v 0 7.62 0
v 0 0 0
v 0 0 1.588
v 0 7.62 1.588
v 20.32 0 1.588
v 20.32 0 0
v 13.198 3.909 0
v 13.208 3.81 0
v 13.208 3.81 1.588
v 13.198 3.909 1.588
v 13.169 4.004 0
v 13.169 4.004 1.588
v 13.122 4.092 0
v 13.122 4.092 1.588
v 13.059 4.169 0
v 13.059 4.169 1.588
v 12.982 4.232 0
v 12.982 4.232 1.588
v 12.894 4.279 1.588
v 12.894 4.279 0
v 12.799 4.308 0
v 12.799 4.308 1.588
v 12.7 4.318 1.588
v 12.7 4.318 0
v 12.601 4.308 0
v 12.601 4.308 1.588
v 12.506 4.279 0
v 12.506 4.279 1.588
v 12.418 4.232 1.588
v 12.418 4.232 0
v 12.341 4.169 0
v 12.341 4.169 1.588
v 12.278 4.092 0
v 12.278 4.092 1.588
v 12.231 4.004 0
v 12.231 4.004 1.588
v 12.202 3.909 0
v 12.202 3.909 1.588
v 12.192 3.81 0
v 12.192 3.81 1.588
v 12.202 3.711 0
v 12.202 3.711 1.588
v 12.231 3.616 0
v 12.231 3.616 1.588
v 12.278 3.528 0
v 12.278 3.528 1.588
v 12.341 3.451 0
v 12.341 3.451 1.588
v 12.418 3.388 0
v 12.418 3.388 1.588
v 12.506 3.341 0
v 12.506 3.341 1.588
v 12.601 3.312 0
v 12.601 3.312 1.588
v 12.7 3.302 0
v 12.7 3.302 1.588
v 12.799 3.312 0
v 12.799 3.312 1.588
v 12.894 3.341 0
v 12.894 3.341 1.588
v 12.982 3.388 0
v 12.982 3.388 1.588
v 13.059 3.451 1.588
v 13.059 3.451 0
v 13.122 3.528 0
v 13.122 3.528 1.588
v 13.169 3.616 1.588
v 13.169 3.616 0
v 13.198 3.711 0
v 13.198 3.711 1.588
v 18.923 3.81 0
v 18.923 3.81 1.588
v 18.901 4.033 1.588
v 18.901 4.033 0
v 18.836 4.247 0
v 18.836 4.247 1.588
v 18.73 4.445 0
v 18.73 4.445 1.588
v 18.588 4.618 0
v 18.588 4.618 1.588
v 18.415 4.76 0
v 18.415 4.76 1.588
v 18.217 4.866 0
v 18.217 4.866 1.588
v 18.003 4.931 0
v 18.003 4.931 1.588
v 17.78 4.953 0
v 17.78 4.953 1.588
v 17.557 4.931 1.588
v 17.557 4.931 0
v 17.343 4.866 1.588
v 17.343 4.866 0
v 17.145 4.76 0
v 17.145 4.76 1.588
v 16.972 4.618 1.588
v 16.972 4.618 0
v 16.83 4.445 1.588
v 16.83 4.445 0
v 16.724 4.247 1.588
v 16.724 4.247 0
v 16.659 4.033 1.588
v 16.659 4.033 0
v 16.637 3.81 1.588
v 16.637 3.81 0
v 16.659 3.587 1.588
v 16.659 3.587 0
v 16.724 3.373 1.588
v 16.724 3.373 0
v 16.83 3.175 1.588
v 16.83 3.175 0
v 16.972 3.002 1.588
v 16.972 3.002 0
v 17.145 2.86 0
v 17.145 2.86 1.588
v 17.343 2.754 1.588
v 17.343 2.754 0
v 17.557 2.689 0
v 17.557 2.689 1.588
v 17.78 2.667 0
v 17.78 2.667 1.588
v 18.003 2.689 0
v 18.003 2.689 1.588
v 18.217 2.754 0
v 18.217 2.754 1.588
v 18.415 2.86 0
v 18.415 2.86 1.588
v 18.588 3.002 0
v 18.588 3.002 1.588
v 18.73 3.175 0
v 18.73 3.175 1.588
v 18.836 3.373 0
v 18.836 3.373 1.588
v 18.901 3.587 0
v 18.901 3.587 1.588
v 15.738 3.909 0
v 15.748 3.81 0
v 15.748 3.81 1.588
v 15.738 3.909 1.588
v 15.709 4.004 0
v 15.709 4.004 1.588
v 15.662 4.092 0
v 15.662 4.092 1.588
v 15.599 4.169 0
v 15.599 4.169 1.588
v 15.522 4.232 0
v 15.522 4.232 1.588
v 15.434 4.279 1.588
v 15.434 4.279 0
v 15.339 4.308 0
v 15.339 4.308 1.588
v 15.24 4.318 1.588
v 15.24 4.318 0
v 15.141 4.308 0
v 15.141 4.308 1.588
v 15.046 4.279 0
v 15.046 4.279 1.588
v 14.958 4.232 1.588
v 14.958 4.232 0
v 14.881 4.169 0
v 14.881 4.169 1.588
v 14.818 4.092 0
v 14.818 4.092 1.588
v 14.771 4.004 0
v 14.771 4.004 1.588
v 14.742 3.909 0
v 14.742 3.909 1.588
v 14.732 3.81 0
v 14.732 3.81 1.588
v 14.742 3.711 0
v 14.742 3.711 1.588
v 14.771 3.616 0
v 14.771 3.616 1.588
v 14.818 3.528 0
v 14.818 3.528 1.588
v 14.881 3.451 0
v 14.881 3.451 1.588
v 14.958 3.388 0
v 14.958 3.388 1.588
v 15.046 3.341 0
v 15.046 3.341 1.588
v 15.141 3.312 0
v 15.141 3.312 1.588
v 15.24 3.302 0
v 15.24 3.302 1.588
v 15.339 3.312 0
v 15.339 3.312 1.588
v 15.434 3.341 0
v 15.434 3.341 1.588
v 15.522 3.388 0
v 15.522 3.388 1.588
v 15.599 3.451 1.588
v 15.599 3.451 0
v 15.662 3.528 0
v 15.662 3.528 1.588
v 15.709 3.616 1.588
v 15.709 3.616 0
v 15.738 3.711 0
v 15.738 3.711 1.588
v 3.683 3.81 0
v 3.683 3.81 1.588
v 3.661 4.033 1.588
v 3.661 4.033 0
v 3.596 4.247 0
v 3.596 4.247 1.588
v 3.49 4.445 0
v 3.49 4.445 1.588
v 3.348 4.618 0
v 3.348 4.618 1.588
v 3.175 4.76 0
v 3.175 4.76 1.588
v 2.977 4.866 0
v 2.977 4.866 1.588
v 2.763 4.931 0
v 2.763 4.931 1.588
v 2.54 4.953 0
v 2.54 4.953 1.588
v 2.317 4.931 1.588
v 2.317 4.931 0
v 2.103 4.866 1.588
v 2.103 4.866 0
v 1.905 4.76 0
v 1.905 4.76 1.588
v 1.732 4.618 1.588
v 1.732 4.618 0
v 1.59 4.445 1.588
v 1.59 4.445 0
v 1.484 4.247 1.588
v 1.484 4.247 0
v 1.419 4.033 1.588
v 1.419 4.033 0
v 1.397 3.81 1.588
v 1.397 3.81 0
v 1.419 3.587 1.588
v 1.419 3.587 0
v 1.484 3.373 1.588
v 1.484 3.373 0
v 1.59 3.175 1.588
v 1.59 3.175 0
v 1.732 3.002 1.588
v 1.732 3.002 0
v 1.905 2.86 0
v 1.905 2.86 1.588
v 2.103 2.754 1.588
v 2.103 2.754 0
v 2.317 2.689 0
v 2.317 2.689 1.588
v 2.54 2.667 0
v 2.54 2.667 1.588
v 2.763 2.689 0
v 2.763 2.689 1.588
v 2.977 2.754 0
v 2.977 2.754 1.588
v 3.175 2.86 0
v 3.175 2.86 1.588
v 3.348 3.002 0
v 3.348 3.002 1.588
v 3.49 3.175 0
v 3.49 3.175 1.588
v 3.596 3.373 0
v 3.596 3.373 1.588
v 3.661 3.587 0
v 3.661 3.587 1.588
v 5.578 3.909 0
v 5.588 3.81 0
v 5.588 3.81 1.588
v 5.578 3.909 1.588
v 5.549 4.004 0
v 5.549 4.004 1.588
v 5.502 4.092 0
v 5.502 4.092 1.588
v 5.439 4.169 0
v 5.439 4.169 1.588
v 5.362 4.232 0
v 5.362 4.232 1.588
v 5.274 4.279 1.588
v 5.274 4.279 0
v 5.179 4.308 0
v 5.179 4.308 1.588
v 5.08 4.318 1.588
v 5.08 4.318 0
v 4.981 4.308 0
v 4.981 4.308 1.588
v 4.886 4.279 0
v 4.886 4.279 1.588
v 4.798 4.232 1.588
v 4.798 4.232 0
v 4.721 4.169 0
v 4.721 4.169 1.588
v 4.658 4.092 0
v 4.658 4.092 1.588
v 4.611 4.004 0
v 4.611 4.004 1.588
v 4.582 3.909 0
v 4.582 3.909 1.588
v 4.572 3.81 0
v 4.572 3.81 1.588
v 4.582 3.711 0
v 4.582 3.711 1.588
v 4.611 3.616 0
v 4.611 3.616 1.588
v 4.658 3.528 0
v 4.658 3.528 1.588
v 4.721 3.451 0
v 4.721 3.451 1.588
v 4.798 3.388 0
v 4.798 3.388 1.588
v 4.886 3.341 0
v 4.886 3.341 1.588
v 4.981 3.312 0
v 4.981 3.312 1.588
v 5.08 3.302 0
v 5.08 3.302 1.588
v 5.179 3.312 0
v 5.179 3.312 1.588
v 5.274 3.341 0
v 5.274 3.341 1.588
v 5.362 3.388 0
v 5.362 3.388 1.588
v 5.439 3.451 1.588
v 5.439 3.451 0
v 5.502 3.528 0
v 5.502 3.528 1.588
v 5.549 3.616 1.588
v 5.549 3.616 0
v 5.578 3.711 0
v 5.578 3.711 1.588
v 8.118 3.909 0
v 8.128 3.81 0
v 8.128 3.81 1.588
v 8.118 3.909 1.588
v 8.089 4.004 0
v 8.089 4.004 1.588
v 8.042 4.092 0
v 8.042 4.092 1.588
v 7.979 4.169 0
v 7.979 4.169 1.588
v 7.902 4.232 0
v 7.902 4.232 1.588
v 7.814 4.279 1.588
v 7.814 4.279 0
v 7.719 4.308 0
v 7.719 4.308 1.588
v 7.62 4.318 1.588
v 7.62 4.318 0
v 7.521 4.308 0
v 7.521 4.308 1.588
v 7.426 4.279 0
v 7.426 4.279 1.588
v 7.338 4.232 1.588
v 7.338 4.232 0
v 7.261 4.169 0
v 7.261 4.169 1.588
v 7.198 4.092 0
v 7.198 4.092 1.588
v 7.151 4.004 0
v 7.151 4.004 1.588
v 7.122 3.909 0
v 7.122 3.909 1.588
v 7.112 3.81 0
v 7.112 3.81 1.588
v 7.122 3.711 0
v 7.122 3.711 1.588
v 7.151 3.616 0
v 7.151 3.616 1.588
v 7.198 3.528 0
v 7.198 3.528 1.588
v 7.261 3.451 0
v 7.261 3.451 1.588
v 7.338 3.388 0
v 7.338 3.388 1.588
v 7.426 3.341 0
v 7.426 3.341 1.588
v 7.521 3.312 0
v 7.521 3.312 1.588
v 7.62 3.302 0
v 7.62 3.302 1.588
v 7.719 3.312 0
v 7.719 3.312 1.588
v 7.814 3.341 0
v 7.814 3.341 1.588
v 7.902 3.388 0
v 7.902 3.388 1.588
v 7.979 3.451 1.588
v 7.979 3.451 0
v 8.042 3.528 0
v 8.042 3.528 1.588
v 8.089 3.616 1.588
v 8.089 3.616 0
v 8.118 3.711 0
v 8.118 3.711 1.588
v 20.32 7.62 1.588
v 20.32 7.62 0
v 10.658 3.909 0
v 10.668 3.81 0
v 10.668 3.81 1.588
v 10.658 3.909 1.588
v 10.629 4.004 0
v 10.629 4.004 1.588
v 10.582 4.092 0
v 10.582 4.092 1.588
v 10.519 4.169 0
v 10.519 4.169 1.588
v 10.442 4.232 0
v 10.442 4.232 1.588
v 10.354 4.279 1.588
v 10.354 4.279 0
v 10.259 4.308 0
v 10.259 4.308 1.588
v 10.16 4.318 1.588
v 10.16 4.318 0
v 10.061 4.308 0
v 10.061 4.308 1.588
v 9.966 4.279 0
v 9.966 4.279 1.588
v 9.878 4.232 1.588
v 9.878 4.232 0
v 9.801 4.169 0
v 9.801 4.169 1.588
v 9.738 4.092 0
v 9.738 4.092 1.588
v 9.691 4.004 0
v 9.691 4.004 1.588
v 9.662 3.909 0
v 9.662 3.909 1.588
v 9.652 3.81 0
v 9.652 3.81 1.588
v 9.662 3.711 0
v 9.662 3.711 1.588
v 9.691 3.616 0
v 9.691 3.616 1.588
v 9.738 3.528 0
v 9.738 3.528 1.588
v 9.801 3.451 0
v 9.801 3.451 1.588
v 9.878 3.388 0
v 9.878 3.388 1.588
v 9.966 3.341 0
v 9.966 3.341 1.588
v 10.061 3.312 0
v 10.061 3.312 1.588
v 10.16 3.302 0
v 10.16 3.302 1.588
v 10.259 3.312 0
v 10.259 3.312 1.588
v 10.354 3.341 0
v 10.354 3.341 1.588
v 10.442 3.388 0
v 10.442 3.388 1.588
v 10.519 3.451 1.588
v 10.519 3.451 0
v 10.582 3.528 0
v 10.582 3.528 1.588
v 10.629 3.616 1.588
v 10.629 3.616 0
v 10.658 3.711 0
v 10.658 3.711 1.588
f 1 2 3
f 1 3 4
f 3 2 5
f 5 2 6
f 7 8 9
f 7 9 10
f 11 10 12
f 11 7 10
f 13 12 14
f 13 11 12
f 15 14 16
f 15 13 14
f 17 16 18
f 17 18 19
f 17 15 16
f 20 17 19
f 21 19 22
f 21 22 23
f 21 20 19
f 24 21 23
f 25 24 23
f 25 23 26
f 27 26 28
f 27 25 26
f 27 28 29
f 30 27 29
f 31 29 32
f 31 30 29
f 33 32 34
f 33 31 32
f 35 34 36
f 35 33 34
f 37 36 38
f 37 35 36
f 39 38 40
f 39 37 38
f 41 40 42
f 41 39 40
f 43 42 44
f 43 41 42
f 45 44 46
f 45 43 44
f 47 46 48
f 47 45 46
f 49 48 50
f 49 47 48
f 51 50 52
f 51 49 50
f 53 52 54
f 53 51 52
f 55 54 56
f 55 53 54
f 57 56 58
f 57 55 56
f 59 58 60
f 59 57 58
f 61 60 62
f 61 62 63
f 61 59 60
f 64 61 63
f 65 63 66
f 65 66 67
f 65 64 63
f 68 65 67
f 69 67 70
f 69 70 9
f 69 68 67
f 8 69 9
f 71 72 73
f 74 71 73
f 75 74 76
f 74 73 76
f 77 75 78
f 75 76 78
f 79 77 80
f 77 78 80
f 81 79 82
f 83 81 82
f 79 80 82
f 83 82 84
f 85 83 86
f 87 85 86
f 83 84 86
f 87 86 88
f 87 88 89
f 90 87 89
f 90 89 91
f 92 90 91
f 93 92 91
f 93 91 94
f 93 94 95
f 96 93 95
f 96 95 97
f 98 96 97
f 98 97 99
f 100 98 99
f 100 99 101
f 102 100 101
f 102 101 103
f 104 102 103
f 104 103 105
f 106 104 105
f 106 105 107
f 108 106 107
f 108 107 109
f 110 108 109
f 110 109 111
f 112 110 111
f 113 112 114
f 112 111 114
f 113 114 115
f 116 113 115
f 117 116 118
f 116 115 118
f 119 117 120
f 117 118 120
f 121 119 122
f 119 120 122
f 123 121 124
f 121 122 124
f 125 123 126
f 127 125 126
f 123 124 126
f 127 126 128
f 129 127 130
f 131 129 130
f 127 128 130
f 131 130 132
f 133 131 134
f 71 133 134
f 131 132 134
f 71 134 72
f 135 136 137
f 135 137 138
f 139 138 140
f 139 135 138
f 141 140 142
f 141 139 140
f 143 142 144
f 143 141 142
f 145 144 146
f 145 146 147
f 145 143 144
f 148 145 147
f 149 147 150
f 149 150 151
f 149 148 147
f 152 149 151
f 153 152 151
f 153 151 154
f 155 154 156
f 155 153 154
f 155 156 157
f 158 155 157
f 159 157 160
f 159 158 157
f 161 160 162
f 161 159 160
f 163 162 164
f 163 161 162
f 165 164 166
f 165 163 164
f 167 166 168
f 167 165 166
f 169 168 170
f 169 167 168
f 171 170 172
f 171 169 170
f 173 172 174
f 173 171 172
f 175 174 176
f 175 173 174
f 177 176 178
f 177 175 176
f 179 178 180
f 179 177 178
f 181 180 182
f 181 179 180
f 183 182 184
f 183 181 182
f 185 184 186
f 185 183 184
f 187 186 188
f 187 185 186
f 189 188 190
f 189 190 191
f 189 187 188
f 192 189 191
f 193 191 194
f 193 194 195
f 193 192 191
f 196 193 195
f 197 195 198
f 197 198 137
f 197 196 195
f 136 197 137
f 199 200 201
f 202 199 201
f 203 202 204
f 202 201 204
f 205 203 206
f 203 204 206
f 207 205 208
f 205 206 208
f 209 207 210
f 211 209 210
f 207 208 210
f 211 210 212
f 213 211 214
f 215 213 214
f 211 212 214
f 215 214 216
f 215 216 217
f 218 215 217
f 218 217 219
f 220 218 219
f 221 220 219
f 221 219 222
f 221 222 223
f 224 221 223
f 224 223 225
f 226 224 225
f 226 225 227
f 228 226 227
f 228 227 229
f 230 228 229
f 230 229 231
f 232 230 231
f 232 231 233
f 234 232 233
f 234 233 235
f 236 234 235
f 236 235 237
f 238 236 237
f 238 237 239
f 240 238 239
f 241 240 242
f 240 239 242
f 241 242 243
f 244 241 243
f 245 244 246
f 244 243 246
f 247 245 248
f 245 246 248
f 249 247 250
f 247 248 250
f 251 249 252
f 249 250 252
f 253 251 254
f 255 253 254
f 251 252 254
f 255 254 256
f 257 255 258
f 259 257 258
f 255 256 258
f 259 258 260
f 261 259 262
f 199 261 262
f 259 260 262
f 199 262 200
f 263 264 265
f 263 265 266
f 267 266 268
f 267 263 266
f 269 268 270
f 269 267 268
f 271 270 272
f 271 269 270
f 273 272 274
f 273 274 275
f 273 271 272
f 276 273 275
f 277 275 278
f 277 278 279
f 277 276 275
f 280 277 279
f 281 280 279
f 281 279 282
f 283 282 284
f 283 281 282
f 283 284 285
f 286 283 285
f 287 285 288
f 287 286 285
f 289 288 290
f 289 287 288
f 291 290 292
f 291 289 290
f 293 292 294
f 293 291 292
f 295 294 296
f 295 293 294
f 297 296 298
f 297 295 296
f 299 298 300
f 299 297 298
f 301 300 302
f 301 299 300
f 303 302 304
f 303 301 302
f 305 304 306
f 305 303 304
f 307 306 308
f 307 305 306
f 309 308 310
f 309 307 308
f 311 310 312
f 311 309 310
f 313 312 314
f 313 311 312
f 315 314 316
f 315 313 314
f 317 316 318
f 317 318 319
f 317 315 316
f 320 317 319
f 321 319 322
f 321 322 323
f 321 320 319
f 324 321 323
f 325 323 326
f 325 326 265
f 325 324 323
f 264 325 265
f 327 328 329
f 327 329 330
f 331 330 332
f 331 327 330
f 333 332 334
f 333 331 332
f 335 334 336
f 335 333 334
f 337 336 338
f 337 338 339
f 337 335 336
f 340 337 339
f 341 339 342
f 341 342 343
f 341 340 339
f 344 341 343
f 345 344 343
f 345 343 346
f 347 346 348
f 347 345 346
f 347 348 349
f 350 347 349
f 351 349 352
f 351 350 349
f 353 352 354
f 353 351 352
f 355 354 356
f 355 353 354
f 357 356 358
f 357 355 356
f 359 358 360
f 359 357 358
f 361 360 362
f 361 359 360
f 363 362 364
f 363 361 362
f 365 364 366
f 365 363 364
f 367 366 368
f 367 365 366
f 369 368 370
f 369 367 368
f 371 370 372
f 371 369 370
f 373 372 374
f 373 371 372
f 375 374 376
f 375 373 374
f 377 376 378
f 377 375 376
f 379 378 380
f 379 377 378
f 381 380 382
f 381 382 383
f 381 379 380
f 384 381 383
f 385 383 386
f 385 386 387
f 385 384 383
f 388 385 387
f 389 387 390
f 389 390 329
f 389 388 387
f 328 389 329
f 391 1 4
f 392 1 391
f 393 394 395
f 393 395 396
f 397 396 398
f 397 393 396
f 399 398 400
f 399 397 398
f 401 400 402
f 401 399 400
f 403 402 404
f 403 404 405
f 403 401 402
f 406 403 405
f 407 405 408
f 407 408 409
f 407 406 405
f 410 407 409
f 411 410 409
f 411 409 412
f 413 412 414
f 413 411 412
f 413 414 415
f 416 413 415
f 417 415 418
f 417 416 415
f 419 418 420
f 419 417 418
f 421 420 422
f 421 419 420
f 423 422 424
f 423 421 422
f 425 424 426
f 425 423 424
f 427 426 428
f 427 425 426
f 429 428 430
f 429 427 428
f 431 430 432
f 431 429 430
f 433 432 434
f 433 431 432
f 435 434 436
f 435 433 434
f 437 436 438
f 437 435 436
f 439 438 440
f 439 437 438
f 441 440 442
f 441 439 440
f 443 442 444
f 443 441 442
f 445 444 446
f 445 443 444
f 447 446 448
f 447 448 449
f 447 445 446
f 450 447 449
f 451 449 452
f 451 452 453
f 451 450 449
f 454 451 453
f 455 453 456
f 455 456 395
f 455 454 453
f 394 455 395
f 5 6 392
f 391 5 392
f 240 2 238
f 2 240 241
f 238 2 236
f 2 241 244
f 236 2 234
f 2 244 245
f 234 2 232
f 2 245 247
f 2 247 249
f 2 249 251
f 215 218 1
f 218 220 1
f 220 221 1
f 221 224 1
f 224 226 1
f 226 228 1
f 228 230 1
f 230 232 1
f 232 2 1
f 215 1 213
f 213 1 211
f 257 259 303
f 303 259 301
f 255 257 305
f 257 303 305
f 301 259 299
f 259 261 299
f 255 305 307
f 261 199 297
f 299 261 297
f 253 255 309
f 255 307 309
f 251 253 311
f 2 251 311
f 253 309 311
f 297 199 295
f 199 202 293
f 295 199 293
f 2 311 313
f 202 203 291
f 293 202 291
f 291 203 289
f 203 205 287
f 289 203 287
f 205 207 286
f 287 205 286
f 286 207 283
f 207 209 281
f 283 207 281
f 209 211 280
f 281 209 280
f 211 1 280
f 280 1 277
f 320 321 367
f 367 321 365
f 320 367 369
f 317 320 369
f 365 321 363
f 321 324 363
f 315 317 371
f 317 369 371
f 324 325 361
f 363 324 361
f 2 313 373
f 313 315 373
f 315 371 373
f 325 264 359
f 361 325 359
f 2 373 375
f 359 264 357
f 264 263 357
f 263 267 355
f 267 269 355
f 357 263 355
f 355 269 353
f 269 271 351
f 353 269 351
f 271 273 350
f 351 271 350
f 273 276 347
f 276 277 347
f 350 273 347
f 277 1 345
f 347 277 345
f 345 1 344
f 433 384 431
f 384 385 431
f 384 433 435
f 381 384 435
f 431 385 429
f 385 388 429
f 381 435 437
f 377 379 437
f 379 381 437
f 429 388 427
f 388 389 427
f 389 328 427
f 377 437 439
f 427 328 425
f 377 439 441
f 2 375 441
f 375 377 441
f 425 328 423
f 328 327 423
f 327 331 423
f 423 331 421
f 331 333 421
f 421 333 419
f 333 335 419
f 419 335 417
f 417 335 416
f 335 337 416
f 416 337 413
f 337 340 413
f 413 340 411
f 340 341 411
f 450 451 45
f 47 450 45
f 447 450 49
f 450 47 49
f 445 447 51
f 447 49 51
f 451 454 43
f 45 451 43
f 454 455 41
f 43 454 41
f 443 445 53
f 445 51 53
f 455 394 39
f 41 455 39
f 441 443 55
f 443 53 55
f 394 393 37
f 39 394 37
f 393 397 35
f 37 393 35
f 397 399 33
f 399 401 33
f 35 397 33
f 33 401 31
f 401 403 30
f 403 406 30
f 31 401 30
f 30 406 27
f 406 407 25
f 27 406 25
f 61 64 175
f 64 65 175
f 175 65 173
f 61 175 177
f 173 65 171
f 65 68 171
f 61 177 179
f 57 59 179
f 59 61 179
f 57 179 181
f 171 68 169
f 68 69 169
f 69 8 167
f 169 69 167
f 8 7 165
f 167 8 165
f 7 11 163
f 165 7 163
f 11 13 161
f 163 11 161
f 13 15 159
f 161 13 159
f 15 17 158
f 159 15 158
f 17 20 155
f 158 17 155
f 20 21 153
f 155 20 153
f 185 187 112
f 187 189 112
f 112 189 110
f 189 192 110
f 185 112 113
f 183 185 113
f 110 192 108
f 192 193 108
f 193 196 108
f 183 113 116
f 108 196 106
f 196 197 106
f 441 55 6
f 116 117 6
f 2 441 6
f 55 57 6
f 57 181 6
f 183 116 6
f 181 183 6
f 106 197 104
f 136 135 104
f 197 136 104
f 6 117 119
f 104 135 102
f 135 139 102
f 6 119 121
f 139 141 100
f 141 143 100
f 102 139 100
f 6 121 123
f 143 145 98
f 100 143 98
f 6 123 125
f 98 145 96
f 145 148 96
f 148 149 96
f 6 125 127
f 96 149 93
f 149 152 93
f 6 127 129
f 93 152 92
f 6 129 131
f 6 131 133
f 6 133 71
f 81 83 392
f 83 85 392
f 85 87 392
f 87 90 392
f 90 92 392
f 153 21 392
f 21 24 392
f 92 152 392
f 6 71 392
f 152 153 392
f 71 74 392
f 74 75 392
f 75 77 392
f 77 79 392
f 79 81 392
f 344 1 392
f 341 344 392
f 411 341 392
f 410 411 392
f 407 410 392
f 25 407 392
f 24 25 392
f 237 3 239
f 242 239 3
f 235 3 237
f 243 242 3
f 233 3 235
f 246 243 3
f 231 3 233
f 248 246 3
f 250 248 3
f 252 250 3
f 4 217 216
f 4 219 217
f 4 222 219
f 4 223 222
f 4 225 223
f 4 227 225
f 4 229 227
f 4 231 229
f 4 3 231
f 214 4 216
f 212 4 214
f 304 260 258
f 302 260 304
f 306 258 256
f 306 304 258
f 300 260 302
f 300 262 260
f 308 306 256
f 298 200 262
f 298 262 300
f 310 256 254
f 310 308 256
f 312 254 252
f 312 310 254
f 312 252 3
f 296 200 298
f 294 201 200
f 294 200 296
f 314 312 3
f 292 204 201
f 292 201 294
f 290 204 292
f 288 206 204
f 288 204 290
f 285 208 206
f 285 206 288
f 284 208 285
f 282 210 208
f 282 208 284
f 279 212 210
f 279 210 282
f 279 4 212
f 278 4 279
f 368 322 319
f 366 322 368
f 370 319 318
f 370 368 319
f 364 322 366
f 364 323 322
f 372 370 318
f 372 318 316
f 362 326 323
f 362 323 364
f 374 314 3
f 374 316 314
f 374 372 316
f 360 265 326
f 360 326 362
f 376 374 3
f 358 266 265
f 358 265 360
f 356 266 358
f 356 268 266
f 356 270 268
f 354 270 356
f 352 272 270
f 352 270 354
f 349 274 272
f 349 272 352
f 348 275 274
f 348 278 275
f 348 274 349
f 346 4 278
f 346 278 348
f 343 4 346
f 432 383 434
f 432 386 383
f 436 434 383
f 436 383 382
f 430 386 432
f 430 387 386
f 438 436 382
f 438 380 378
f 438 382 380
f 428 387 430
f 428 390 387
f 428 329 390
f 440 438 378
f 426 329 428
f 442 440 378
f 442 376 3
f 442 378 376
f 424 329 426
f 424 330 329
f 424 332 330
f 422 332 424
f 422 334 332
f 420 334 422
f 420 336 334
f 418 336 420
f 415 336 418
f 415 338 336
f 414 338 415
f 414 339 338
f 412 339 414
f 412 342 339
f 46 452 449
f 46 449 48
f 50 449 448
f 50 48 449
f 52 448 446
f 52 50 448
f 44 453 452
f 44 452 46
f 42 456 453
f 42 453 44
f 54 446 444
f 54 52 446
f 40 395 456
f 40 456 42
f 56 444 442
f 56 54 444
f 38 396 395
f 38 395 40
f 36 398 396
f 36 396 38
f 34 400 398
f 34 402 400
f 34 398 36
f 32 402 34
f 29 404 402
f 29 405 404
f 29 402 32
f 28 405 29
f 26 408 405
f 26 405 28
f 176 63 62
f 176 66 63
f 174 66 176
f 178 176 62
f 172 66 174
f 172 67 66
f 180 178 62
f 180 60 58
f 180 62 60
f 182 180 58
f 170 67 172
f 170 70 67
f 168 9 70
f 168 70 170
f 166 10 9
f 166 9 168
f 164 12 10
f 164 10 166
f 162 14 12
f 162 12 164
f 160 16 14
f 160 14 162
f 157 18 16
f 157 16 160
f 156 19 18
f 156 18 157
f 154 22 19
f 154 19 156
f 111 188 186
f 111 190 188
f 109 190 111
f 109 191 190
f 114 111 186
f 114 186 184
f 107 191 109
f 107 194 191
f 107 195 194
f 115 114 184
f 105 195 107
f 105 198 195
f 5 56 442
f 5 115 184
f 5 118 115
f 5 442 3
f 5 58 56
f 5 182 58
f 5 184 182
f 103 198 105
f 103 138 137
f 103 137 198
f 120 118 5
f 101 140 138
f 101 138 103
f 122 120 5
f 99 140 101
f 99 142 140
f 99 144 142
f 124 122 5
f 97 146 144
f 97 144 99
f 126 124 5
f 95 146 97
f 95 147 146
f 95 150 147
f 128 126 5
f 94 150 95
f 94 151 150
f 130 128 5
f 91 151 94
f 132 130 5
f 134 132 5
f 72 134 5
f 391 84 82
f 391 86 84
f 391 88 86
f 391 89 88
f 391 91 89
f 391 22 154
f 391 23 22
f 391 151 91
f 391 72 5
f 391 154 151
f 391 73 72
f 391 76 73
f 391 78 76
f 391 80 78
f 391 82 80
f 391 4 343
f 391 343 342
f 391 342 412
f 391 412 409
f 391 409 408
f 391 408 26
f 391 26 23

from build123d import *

# Parameters (mm, degrees)
SKETCH1_W           = 20.32
SKETCH1_H           = 7.62
SKETCH1_R           = 0.508
BOSS_EXTRUDE1_DEPTH = 1.5875
SKETCH2_R           = 1.143
CUT_EXTRUDE1_DEPTH  = 22.759755427


with BuildPart() as part:
    # Sketch1 → Boss-Extrude1 (new body)
    with BuildSketch(Plane.XY):
        with Locations((10.16, 3.81)):
            Rectangle(SKETCH1_W, SKETCH1_H)
        with Locations((2.54, 3.81)):
            Circle(SKETCH1_R, mode=Mode.SUBTRACT)
        with Locations((5.08, 3.81)):
            Circle(SKETCH1_R, mode=Mode.SUBTRACT)
        with Locations((7.62, 3.81)):
            Circle(SKETCH1_R, mode=Mode.SUBTRACT)
        with Locations((10.16, 3.81)):
            Circle(SKETCH1_R, mode=Mode.SUBTRACT)
        with Locations((12.7, 3.81)):
            Circle(SKETCH1_R, mode=Mode.SUBTRACT)
        with Locations((15.24, 3.81)):
            Circle(SKETCH1_R, mode=Mode.SUBTRACT)
        with Locations((17.78, 3.81)):
            Circle(SKETCH1_R, mode=Mode.SUBTRACT)
    extrude(amount=BOSS_EXTRUDE1_DEPTH)

    # Sketch2 → Cut-Extrude1 (cut, through all)
    with BuildSketch(Plane.XY.offset(1.5875)):
        with Locations((2.54, 3.81)):
            Circle(SKETCH2_R)
        with Locations((17.78, 3.81)):
            Circle(SKETCH2_R)
    extrude(amount=-CUT_EXTRUDE1_DEPTH, mode=Mode.SUBTRACT)


solid = part.part
